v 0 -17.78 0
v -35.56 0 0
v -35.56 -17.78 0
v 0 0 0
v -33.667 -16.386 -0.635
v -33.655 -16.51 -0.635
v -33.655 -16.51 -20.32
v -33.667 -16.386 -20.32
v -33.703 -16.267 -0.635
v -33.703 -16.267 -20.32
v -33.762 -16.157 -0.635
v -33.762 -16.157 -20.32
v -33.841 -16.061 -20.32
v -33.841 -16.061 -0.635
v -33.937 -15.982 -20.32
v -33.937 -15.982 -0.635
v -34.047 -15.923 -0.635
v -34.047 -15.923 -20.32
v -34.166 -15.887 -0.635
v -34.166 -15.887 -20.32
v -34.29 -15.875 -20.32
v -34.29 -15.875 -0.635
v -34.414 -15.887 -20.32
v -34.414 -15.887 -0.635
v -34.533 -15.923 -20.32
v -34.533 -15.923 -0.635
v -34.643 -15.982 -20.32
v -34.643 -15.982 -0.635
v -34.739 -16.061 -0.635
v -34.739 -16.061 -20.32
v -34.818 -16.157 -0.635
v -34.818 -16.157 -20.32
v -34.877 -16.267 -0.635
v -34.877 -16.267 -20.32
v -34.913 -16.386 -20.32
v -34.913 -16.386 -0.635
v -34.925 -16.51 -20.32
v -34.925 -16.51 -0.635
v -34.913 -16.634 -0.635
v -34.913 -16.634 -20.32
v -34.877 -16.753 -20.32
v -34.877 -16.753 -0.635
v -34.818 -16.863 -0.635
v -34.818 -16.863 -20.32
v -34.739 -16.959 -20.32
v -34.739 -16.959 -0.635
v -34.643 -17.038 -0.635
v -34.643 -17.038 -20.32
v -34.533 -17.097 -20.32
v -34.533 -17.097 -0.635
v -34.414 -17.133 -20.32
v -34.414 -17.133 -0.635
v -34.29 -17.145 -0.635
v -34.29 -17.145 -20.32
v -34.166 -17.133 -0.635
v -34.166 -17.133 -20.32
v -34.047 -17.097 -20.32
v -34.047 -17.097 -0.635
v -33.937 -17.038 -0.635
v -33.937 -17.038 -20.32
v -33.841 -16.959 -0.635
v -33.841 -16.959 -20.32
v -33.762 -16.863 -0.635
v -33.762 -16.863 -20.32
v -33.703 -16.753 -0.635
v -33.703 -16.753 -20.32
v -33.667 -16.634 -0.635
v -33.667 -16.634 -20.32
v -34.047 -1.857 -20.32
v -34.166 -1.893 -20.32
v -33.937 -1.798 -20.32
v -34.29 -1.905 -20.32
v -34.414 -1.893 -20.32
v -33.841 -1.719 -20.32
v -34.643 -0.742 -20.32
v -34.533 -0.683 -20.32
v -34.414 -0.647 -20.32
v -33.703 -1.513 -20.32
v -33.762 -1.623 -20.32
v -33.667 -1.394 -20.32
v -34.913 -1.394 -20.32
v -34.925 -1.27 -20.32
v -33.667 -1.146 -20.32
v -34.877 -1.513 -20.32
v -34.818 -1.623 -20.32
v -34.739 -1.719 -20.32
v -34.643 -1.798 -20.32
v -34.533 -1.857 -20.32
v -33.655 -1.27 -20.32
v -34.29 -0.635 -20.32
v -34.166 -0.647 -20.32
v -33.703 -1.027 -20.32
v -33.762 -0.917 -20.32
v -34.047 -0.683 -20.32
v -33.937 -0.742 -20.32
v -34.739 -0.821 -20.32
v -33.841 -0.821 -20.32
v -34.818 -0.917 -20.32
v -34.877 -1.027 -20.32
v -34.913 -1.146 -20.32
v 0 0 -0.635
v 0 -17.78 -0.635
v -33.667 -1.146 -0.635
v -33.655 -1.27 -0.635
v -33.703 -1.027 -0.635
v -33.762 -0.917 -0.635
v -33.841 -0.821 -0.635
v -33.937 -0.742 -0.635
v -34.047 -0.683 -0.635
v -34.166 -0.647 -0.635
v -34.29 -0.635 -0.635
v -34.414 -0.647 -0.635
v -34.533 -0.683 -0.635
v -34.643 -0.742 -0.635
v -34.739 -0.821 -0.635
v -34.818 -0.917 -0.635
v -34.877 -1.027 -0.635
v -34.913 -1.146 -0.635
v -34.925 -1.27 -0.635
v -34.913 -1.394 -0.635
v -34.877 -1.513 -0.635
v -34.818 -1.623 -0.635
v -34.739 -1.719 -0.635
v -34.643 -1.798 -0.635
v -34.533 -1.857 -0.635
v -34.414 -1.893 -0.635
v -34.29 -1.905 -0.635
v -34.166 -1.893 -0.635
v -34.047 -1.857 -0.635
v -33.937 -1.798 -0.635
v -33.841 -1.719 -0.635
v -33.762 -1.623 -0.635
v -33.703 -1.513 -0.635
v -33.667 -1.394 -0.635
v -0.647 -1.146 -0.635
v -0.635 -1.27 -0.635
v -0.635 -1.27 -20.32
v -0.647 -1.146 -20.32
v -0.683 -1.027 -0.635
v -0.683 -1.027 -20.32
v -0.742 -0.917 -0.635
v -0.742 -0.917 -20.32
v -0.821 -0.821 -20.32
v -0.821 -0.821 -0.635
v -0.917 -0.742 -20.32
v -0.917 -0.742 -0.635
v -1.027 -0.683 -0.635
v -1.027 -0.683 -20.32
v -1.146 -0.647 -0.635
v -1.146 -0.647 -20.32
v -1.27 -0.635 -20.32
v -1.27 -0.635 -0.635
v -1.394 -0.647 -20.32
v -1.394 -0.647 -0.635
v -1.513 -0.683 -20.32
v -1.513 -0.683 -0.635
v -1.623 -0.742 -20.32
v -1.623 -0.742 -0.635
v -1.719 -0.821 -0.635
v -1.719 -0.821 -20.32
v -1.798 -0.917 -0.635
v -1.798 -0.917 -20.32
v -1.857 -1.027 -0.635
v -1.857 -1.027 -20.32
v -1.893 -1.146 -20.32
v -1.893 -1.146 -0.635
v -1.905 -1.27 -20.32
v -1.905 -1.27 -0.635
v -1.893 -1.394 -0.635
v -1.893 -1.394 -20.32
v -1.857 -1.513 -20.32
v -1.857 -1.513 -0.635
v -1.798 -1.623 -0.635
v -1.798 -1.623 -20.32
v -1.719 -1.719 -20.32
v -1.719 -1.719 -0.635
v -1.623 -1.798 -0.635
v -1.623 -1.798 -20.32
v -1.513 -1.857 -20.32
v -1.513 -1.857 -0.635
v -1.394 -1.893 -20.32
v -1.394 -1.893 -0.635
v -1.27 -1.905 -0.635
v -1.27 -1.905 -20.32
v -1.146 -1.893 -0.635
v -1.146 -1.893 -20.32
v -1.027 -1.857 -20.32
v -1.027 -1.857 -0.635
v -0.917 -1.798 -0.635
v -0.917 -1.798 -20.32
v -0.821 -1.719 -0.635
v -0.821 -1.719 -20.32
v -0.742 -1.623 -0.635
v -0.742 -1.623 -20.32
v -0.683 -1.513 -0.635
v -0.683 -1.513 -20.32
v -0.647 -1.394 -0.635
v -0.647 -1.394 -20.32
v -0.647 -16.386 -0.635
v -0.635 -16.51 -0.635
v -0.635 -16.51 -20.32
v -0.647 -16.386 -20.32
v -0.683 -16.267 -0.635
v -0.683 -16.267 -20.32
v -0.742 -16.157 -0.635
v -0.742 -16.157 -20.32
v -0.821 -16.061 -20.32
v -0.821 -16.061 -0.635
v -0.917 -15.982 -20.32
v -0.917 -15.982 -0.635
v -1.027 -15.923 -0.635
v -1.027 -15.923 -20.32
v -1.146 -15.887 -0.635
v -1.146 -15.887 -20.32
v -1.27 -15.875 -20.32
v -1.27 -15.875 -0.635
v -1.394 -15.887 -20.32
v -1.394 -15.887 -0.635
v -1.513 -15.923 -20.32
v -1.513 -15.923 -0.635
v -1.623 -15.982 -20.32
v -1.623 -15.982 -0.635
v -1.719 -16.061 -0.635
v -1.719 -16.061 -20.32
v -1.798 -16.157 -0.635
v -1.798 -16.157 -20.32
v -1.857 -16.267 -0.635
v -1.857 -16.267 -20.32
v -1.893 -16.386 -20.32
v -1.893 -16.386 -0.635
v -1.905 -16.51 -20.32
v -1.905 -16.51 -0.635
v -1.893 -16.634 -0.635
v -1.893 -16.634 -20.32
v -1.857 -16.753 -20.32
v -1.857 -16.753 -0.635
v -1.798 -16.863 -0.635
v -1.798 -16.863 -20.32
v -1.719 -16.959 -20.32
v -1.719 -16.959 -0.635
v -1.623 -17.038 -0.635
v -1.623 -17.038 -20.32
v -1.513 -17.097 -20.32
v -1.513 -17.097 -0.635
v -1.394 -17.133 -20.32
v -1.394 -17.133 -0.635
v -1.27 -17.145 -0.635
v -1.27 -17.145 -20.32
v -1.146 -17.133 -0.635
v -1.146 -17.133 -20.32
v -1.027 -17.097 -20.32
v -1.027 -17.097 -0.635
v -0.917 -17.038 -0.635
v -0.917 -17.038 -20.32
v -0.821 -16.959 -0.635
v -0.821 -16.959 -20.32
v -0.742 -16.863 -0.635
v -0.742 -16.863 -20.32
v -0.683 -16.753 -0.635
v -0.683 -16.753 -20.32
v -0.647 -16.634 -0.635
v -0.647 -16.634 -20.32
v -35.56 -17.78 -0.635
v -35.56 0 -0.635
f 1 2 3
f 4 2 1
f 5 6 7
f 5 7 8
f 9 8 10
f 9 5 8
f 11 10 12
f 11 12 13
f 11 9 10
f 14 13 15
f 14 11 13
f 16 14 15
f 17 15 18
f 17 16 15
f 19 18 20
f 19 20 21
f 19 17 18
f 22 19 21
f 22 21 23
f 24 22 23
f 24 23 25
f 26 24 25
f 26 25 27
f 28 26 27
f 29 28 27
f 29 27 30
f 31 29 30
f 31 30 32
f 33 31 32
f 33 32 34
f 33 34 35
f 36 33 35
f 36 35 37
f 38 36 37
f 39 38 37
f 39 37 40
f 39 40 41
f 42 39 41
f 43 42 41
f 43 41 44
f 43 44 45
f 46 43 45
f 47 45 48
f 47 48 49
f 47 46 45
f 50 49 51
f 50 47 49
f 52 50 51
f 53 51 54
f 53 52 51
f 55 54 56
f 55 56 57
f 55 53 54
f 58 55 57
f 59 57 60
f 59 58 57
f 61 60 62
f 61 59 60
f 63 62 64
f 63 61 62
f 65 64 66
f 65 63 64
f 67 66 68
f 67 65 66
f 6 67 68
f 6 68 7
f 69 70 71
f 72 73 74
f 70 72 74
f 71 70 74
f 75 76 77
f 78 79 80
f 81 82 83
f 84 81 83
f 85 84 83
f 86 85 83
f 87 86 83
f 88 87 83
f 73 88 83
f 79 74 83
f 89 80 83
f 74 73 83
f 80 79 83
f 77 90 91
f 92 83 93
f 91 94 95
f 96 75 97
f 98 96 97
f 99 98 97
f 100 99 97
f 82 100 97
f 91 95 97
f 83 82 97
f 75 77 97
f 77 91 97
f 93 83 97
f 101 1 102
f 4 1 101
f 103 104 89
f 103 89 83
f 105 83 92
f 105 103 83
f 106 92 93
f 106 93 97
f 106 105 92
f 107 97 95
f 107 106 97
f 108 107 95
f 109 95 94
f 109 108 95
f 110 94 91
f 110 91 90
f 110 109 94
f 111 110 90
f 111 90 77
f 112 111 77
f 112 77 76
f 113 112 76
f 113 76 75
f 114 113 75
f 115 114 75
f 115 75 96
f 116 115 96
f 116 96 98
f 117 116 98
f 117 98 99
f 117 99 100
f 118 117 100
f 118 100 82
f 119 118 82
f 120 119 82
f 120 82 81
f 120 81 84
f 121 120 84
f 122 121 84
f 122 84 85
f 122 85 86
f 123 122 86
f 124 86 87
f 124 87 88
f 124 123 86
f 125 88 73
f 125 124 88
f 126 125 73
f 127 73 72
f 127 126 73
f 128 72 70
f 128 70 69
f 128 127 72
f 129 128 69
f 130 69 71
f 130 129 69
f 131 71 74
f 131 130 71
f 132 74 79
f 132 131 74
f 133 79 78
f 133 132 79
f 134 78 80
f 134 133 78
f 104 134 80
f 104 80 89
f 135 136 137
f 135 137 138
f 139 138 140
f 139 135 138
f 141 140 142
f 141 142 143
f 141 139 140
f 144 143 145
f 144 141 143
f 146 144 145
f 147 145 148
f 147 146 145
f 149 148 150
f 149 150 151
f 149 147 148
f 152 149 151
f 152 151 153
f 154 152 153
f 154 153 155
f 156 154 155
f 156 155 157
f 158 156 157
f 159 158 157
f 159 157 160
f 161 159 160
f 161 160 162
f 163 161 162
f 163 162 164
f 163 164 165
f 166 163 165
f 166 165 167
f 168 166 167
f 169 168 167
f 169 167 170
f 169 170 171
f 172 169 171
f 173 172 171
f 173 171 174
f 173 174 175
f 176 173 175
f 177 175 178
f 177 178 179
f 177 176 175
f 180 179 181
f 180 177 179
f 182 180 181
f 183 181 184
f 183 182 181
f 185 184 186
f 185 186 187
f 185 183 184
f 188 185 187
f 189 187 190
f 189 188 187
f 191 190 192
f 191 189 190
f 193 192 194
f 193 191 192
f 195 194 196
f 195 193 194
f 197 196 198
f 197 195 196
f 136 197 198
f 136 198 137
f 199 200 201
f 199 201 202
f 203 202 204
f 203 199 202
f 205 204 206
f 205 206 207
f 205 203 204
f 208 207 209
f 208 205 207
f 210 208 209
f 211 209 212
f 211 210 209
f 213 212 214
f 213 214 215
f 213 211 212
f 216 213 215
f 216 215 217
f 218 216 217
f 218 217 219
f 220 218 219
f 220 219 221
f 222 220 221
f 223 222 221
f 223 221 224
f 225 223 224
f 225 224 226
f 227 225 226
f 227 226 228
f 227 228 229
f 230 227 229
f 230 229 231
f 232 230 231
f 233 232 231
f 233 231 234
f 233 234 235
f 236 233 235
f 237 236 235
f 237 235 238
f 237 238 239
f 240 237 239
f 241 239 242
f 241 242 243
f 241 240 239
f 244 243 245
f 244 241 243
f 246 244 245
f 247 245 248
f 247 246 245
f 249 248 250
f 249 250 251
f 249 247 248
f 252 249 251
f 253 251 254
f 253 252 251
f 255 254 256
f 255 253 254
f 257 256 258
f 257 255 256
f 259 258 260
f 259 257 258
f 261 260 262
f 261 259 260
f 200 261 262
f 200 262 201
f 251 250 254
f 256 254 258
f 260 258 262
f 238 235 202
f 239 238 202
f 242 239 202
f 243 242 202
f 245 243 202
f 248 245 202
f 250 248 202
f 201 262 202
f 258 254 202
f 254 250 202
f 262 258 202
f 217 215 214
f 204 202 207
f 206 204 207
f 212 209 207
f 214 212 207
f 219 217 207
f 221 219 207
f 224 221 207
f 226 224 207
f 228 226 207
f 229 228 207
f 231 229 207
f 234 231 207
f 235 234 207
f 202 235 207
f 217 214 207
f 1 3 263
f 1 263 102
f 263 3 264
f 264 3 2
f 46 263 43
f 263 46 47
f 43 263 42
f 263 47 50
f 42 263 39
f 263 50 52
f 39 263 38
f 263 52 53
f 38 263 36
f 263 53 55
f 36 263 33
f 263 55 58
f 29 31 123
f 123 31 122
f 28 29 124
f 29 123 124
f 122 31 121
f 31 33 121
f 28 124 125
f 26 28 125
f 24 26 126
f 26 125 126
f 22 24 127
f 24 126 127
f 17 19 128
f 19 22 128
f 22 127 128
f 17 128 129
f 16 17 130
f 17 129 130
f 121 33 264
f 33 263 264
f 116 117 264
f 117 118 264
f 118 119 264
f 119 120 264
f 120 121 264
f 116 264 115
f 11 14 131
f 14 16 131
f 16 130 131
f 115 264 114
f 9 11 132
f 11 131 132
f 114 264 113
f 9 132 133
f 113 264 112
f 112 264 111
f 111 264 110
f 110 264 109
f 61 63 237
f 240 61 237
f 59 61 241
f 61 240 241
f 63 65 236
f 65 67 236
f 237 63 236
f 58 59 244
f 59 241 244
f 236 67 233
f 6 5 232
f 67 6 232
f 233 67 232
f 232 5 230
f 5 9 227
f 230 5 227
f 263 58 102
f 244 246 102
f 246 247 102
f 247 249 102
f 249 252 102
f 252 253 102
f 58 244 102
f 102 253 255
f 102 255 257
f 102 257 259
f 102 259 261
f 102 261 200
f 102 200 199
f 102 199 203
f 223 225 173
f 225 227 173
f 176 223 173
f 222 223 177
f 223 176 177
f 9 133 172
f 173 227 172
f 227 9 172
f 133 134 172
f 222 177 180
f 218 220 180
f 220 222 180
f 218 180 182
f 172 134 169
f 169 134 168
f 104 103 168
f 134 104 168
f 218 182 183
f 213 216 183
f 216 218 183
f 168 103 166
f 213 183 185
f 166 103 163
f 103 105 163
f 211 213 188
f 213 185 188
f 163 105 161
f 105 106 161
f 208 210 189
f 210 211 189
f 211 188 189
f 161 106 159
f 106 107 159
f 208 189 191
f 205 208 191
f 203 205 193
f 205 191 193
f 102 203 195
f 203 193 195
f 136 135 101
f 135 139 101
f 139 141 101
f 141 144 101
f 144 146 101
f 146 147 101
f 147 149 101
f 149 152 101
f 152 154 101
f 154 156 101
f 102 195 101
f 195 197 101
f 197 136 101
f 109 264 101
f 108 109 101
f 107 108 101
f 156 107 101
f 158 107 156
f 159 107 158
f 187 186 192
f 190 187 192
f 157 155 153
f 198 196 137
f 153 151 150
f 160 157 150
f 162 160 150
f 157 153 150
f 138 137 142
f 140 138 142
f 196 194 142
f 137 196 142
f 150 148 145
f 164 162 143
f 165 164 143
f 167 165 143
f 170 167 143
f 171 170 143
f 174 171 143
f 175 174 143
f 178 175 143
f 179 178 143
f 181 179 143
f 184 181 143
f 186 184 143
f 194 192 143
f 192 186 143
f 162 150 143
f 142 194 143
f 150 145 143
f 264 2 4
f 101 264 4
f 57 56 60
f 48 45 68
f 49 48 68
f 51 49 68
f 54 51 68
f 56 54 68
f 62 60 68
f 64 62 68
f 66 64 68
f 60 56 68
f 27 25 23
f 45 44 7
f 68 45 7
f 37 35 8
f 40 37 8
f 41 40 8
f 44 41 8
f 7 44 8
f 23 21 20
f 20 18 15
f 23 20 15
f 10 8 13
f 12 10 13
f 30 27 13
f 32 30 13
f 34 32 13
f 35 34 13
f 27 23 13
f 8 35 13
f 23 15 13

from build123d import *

# Parameters (mm, degrees)
F0_W     = 35.56
F0_H     = 17.78
F1_DEPTH = 0.635
F2_R     = 0.635
F3_DEPTH = 20.32


with BuildPart() as f1:
    # F0 (on Top) → F1 (new body)
    with BuildSketch(Plane.XY):
        with Locations((-17.78, -8.89)):
            Rectangle(F0_W, F0_H)
    extrude(amount=-F1_DEPTH)

    # F2 (on Top) → F3 (join)
    with BuildSketch(Plane.XY):
        with Locations((-34.29, -1.27)):
            Circle(F2_R)
        with Locations((-34.29, -16.51)):
            Circle(F2_R)
        with Locations((-1.27, -16.51)):
            Circle(F2_R)
        with Locations((-1.27, -1.27)):
            Circle(F2_R)
    extrude(amount=-F3_DEPTH)


solid = f1.part
